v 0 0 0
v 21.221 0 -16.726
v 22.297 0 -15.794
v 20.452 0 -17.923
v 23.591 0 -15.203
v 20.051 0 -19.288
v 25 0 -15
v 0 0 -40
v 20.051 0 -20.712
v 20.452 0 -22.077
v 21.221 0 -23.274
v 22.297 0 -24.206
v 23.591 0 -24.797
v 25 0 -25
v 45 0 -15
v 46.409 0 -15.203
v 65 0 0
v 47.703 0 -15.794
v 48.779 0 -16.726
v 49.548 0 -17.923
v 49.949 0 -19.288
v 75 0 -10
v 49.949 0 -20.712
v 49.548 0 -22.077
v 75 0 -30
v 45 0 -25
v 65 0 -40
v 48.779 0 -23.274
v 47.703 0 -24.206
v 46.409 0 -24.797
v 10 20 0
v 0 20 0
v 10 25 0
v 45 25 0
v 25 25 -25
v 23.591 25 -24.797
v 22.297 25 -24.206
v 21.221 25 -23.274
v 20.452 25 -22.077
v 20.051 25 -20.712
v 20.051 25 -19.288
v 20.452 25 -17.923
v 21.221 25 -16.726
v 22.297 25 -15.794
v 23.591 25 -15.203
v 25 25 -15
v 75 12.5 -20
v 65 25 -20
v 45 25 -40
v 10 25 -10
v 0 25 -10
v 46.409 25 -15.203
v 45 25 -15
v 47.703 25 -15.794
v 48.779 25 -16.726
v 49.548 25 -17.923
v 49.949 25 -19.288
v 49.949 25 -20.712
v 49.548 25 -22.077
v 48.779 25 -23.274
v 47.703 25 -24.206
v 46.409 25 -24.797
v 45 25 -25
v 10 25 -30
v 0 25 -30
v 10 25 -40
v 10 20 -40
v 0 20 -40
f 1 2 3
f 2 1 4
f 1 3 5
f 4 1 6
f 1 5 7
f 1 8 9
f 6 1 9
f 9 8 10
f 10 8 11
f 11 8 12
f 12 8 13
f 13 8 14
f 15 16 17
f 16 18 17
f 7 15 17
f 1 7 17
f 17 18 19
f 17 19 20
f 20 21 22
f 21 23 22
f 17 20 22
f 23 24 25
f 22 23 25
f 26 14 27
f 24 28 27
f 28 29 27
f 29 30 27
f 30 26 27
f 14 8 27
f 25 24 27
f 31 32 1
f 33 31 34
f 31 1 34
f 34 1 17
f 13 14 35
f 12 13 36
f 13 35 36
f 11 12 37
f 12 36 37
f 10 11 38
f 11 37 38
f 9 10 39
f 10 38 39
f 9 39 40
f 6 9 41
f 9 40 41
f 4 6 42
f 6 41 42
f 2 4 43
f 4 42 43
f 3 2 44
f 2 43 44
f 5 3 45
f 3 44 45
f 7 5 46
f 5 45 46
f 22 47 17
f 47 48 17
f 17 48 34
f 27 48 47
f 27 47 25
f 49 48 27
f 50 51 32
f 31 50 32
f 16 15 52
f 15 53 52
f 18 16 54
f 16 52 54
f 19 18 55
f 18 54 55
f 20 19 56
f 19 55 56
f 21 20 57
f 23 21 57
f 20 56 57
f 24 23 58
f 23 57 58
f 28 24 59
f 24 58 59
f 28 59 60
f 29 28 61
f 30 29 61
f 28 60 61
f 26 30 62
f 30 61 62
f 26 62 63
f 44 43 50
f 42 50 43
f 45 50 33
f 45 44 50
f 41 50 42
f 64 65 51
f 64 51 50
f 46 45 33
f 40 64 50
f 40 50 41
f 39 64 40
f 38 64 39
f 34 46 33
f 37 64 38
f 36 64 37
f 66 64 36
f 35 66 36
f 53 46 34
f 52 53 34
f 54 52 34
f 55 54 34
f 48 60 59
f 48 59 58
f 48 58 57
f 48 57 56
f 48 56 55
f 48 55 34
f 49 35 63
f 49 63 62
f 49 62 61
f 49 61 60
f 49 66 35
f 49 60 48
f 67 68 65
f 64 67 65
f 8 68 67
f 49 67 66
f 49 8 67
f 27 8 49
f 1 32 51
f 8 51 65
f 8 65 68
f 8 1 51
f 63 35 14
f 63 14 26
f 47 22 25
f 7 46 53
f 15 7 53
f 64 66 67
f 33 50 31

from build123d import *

# Parameters (mm, degrees)
SKETCH1_W           = 75
SKETCH1_H           = 40
BOSS_EXTRUDE1_DEPTH = 25
SKETCH5_W           = 56.924134656
SKETCH5_H           = 49.860042304
CUT_EXTRUDE1_DEPTH  = 19.463723647
SKETCH9_W           = 66.205259198
SKETCH9_H           = 57.927204101
CUT_EXTRUDE4_DEPTH  = 19.463723647
CUT_EXTRUDE5_DEPTH  = 10
CUT_EXTRUDE6_DEPTH  = 10
SKETCH12_R          = 5
CUT_EXTRUDE7_DEPTH  = 26
SKETCH13_R          = 5
CUT_EXTRUDE8_DEPTH  = 26
SKETCH14_W          = 20
SKETCH14_H          = 10
CUT_EXTRUDE9_DEPTH  = 26


with BuildPart() as part:
    # Sketch1 → Boss-Extrude1 (new body)
    with BuildSketch(Plane(origin=(0, 0, 0), x_dir=(1, 0, 0), z_dir=(0, 1, 0))):
        with Locations((37.5, 20)):
            Rectangle(SKETCH1_W, SKETCH1_H)
    extrude(amount=BOSS_EXTRUDE1_DEPTH)

    # Sketch5 → Cut-Extrude1 (cut, through all)
    with BuildSketch(Plane(origin=(24.621212121, 19.696969697, 24.621212121), x_dir=(-0.48059153, -0.384473224, 0.788170109), z_dir=(-0.615457455, -0.492365964, -0.615457455))):
        with Locations((-56.377268539, -29.25842023)):
            Rectangle(SKETCH5_W, SKETCH5_H)
    extrude(amount=-CUT_EXTRUDE1_DEPTH, mode=Mode.SUBTRACT)

    # Sketch9 → Cut-Extrude4 (cut, through all)
    with BuildSketch(Plane(origin=(39.772727273, 31.818181818, -39.772727273), x_dir=(-0.48059153, -0.384473224, -0.788170109), z_dir=(0.615457455, 0.492365964, -0.615457455))):
        with Locations((-25.664759868, -34.253534267)):
            Rectangle(SKETCH9_W, SKETCH9_H)
    extrude(amount=CUT_EXTRUDE4_DEPTH, mode=Mode.SUBTRACT)

    # Sketch10 → Cut-Extrude5 (cut)
    with BuildSketch(Plane.ZY):
        Polygon((-10, 25), (0, 20), (0, 25), align=None)
    extrude(amount=-CUT_EXTRUDE5_DEPTH, mode=Mode.SUBTRACT)

    # Sketch11 → Cut-Extrude6 (cut)
    with BuildSketch(Plane.ZY):
        Polygon((-40, 20), (-30, 25), (-40, 25), align=None)
    extrude(amount=-CUT_EXTRUDE6_DEPTH, mode=Mode.SUBTRACT)

    # Sketch12 → Cut-Extrude7 (cut, through all)
    with BuildSketch(Plane(origin=(0, 25, 0), x_dir=(1, 0, 0), z_dir=(0, 1, 0))):
        with Locations((25, 20)):
            Circle(SKETCH12_R)
    extrude(amount=-CUT_EXTRUDE7_DEPTH, mode=Mode.SUBTRACT)

    # Sketch13 → Cut-Extrude8 (cut, through all)
    with BuildSketch(Plane(origin=(0, 25, 0), x_dir=(1, 0, 0), z_dir=(0, 1, 0))):
        with Locations((45, 20)):
            Circle(SKETCH13_R)
    extrude(amount=-CUT_EXTRUDE8_DEPTH, mode=Mode.SUBTRACT)

    # Sketch14 → Cut-Extrude9 (cut, through all)
    with BuildSketch(Plane(origin=(0, 25, 0), x_dir=(1, 0, 0), z_dir=(0, 1, 0))):
        with Locations((35, 20)):
            Rectangle(SKETCH14_W, SKETCH14_H)
    extrude(amount=-CUT_EXTRUDE9_DEPTH, mode=Mode.SUBTRACT)


solid = part.part
